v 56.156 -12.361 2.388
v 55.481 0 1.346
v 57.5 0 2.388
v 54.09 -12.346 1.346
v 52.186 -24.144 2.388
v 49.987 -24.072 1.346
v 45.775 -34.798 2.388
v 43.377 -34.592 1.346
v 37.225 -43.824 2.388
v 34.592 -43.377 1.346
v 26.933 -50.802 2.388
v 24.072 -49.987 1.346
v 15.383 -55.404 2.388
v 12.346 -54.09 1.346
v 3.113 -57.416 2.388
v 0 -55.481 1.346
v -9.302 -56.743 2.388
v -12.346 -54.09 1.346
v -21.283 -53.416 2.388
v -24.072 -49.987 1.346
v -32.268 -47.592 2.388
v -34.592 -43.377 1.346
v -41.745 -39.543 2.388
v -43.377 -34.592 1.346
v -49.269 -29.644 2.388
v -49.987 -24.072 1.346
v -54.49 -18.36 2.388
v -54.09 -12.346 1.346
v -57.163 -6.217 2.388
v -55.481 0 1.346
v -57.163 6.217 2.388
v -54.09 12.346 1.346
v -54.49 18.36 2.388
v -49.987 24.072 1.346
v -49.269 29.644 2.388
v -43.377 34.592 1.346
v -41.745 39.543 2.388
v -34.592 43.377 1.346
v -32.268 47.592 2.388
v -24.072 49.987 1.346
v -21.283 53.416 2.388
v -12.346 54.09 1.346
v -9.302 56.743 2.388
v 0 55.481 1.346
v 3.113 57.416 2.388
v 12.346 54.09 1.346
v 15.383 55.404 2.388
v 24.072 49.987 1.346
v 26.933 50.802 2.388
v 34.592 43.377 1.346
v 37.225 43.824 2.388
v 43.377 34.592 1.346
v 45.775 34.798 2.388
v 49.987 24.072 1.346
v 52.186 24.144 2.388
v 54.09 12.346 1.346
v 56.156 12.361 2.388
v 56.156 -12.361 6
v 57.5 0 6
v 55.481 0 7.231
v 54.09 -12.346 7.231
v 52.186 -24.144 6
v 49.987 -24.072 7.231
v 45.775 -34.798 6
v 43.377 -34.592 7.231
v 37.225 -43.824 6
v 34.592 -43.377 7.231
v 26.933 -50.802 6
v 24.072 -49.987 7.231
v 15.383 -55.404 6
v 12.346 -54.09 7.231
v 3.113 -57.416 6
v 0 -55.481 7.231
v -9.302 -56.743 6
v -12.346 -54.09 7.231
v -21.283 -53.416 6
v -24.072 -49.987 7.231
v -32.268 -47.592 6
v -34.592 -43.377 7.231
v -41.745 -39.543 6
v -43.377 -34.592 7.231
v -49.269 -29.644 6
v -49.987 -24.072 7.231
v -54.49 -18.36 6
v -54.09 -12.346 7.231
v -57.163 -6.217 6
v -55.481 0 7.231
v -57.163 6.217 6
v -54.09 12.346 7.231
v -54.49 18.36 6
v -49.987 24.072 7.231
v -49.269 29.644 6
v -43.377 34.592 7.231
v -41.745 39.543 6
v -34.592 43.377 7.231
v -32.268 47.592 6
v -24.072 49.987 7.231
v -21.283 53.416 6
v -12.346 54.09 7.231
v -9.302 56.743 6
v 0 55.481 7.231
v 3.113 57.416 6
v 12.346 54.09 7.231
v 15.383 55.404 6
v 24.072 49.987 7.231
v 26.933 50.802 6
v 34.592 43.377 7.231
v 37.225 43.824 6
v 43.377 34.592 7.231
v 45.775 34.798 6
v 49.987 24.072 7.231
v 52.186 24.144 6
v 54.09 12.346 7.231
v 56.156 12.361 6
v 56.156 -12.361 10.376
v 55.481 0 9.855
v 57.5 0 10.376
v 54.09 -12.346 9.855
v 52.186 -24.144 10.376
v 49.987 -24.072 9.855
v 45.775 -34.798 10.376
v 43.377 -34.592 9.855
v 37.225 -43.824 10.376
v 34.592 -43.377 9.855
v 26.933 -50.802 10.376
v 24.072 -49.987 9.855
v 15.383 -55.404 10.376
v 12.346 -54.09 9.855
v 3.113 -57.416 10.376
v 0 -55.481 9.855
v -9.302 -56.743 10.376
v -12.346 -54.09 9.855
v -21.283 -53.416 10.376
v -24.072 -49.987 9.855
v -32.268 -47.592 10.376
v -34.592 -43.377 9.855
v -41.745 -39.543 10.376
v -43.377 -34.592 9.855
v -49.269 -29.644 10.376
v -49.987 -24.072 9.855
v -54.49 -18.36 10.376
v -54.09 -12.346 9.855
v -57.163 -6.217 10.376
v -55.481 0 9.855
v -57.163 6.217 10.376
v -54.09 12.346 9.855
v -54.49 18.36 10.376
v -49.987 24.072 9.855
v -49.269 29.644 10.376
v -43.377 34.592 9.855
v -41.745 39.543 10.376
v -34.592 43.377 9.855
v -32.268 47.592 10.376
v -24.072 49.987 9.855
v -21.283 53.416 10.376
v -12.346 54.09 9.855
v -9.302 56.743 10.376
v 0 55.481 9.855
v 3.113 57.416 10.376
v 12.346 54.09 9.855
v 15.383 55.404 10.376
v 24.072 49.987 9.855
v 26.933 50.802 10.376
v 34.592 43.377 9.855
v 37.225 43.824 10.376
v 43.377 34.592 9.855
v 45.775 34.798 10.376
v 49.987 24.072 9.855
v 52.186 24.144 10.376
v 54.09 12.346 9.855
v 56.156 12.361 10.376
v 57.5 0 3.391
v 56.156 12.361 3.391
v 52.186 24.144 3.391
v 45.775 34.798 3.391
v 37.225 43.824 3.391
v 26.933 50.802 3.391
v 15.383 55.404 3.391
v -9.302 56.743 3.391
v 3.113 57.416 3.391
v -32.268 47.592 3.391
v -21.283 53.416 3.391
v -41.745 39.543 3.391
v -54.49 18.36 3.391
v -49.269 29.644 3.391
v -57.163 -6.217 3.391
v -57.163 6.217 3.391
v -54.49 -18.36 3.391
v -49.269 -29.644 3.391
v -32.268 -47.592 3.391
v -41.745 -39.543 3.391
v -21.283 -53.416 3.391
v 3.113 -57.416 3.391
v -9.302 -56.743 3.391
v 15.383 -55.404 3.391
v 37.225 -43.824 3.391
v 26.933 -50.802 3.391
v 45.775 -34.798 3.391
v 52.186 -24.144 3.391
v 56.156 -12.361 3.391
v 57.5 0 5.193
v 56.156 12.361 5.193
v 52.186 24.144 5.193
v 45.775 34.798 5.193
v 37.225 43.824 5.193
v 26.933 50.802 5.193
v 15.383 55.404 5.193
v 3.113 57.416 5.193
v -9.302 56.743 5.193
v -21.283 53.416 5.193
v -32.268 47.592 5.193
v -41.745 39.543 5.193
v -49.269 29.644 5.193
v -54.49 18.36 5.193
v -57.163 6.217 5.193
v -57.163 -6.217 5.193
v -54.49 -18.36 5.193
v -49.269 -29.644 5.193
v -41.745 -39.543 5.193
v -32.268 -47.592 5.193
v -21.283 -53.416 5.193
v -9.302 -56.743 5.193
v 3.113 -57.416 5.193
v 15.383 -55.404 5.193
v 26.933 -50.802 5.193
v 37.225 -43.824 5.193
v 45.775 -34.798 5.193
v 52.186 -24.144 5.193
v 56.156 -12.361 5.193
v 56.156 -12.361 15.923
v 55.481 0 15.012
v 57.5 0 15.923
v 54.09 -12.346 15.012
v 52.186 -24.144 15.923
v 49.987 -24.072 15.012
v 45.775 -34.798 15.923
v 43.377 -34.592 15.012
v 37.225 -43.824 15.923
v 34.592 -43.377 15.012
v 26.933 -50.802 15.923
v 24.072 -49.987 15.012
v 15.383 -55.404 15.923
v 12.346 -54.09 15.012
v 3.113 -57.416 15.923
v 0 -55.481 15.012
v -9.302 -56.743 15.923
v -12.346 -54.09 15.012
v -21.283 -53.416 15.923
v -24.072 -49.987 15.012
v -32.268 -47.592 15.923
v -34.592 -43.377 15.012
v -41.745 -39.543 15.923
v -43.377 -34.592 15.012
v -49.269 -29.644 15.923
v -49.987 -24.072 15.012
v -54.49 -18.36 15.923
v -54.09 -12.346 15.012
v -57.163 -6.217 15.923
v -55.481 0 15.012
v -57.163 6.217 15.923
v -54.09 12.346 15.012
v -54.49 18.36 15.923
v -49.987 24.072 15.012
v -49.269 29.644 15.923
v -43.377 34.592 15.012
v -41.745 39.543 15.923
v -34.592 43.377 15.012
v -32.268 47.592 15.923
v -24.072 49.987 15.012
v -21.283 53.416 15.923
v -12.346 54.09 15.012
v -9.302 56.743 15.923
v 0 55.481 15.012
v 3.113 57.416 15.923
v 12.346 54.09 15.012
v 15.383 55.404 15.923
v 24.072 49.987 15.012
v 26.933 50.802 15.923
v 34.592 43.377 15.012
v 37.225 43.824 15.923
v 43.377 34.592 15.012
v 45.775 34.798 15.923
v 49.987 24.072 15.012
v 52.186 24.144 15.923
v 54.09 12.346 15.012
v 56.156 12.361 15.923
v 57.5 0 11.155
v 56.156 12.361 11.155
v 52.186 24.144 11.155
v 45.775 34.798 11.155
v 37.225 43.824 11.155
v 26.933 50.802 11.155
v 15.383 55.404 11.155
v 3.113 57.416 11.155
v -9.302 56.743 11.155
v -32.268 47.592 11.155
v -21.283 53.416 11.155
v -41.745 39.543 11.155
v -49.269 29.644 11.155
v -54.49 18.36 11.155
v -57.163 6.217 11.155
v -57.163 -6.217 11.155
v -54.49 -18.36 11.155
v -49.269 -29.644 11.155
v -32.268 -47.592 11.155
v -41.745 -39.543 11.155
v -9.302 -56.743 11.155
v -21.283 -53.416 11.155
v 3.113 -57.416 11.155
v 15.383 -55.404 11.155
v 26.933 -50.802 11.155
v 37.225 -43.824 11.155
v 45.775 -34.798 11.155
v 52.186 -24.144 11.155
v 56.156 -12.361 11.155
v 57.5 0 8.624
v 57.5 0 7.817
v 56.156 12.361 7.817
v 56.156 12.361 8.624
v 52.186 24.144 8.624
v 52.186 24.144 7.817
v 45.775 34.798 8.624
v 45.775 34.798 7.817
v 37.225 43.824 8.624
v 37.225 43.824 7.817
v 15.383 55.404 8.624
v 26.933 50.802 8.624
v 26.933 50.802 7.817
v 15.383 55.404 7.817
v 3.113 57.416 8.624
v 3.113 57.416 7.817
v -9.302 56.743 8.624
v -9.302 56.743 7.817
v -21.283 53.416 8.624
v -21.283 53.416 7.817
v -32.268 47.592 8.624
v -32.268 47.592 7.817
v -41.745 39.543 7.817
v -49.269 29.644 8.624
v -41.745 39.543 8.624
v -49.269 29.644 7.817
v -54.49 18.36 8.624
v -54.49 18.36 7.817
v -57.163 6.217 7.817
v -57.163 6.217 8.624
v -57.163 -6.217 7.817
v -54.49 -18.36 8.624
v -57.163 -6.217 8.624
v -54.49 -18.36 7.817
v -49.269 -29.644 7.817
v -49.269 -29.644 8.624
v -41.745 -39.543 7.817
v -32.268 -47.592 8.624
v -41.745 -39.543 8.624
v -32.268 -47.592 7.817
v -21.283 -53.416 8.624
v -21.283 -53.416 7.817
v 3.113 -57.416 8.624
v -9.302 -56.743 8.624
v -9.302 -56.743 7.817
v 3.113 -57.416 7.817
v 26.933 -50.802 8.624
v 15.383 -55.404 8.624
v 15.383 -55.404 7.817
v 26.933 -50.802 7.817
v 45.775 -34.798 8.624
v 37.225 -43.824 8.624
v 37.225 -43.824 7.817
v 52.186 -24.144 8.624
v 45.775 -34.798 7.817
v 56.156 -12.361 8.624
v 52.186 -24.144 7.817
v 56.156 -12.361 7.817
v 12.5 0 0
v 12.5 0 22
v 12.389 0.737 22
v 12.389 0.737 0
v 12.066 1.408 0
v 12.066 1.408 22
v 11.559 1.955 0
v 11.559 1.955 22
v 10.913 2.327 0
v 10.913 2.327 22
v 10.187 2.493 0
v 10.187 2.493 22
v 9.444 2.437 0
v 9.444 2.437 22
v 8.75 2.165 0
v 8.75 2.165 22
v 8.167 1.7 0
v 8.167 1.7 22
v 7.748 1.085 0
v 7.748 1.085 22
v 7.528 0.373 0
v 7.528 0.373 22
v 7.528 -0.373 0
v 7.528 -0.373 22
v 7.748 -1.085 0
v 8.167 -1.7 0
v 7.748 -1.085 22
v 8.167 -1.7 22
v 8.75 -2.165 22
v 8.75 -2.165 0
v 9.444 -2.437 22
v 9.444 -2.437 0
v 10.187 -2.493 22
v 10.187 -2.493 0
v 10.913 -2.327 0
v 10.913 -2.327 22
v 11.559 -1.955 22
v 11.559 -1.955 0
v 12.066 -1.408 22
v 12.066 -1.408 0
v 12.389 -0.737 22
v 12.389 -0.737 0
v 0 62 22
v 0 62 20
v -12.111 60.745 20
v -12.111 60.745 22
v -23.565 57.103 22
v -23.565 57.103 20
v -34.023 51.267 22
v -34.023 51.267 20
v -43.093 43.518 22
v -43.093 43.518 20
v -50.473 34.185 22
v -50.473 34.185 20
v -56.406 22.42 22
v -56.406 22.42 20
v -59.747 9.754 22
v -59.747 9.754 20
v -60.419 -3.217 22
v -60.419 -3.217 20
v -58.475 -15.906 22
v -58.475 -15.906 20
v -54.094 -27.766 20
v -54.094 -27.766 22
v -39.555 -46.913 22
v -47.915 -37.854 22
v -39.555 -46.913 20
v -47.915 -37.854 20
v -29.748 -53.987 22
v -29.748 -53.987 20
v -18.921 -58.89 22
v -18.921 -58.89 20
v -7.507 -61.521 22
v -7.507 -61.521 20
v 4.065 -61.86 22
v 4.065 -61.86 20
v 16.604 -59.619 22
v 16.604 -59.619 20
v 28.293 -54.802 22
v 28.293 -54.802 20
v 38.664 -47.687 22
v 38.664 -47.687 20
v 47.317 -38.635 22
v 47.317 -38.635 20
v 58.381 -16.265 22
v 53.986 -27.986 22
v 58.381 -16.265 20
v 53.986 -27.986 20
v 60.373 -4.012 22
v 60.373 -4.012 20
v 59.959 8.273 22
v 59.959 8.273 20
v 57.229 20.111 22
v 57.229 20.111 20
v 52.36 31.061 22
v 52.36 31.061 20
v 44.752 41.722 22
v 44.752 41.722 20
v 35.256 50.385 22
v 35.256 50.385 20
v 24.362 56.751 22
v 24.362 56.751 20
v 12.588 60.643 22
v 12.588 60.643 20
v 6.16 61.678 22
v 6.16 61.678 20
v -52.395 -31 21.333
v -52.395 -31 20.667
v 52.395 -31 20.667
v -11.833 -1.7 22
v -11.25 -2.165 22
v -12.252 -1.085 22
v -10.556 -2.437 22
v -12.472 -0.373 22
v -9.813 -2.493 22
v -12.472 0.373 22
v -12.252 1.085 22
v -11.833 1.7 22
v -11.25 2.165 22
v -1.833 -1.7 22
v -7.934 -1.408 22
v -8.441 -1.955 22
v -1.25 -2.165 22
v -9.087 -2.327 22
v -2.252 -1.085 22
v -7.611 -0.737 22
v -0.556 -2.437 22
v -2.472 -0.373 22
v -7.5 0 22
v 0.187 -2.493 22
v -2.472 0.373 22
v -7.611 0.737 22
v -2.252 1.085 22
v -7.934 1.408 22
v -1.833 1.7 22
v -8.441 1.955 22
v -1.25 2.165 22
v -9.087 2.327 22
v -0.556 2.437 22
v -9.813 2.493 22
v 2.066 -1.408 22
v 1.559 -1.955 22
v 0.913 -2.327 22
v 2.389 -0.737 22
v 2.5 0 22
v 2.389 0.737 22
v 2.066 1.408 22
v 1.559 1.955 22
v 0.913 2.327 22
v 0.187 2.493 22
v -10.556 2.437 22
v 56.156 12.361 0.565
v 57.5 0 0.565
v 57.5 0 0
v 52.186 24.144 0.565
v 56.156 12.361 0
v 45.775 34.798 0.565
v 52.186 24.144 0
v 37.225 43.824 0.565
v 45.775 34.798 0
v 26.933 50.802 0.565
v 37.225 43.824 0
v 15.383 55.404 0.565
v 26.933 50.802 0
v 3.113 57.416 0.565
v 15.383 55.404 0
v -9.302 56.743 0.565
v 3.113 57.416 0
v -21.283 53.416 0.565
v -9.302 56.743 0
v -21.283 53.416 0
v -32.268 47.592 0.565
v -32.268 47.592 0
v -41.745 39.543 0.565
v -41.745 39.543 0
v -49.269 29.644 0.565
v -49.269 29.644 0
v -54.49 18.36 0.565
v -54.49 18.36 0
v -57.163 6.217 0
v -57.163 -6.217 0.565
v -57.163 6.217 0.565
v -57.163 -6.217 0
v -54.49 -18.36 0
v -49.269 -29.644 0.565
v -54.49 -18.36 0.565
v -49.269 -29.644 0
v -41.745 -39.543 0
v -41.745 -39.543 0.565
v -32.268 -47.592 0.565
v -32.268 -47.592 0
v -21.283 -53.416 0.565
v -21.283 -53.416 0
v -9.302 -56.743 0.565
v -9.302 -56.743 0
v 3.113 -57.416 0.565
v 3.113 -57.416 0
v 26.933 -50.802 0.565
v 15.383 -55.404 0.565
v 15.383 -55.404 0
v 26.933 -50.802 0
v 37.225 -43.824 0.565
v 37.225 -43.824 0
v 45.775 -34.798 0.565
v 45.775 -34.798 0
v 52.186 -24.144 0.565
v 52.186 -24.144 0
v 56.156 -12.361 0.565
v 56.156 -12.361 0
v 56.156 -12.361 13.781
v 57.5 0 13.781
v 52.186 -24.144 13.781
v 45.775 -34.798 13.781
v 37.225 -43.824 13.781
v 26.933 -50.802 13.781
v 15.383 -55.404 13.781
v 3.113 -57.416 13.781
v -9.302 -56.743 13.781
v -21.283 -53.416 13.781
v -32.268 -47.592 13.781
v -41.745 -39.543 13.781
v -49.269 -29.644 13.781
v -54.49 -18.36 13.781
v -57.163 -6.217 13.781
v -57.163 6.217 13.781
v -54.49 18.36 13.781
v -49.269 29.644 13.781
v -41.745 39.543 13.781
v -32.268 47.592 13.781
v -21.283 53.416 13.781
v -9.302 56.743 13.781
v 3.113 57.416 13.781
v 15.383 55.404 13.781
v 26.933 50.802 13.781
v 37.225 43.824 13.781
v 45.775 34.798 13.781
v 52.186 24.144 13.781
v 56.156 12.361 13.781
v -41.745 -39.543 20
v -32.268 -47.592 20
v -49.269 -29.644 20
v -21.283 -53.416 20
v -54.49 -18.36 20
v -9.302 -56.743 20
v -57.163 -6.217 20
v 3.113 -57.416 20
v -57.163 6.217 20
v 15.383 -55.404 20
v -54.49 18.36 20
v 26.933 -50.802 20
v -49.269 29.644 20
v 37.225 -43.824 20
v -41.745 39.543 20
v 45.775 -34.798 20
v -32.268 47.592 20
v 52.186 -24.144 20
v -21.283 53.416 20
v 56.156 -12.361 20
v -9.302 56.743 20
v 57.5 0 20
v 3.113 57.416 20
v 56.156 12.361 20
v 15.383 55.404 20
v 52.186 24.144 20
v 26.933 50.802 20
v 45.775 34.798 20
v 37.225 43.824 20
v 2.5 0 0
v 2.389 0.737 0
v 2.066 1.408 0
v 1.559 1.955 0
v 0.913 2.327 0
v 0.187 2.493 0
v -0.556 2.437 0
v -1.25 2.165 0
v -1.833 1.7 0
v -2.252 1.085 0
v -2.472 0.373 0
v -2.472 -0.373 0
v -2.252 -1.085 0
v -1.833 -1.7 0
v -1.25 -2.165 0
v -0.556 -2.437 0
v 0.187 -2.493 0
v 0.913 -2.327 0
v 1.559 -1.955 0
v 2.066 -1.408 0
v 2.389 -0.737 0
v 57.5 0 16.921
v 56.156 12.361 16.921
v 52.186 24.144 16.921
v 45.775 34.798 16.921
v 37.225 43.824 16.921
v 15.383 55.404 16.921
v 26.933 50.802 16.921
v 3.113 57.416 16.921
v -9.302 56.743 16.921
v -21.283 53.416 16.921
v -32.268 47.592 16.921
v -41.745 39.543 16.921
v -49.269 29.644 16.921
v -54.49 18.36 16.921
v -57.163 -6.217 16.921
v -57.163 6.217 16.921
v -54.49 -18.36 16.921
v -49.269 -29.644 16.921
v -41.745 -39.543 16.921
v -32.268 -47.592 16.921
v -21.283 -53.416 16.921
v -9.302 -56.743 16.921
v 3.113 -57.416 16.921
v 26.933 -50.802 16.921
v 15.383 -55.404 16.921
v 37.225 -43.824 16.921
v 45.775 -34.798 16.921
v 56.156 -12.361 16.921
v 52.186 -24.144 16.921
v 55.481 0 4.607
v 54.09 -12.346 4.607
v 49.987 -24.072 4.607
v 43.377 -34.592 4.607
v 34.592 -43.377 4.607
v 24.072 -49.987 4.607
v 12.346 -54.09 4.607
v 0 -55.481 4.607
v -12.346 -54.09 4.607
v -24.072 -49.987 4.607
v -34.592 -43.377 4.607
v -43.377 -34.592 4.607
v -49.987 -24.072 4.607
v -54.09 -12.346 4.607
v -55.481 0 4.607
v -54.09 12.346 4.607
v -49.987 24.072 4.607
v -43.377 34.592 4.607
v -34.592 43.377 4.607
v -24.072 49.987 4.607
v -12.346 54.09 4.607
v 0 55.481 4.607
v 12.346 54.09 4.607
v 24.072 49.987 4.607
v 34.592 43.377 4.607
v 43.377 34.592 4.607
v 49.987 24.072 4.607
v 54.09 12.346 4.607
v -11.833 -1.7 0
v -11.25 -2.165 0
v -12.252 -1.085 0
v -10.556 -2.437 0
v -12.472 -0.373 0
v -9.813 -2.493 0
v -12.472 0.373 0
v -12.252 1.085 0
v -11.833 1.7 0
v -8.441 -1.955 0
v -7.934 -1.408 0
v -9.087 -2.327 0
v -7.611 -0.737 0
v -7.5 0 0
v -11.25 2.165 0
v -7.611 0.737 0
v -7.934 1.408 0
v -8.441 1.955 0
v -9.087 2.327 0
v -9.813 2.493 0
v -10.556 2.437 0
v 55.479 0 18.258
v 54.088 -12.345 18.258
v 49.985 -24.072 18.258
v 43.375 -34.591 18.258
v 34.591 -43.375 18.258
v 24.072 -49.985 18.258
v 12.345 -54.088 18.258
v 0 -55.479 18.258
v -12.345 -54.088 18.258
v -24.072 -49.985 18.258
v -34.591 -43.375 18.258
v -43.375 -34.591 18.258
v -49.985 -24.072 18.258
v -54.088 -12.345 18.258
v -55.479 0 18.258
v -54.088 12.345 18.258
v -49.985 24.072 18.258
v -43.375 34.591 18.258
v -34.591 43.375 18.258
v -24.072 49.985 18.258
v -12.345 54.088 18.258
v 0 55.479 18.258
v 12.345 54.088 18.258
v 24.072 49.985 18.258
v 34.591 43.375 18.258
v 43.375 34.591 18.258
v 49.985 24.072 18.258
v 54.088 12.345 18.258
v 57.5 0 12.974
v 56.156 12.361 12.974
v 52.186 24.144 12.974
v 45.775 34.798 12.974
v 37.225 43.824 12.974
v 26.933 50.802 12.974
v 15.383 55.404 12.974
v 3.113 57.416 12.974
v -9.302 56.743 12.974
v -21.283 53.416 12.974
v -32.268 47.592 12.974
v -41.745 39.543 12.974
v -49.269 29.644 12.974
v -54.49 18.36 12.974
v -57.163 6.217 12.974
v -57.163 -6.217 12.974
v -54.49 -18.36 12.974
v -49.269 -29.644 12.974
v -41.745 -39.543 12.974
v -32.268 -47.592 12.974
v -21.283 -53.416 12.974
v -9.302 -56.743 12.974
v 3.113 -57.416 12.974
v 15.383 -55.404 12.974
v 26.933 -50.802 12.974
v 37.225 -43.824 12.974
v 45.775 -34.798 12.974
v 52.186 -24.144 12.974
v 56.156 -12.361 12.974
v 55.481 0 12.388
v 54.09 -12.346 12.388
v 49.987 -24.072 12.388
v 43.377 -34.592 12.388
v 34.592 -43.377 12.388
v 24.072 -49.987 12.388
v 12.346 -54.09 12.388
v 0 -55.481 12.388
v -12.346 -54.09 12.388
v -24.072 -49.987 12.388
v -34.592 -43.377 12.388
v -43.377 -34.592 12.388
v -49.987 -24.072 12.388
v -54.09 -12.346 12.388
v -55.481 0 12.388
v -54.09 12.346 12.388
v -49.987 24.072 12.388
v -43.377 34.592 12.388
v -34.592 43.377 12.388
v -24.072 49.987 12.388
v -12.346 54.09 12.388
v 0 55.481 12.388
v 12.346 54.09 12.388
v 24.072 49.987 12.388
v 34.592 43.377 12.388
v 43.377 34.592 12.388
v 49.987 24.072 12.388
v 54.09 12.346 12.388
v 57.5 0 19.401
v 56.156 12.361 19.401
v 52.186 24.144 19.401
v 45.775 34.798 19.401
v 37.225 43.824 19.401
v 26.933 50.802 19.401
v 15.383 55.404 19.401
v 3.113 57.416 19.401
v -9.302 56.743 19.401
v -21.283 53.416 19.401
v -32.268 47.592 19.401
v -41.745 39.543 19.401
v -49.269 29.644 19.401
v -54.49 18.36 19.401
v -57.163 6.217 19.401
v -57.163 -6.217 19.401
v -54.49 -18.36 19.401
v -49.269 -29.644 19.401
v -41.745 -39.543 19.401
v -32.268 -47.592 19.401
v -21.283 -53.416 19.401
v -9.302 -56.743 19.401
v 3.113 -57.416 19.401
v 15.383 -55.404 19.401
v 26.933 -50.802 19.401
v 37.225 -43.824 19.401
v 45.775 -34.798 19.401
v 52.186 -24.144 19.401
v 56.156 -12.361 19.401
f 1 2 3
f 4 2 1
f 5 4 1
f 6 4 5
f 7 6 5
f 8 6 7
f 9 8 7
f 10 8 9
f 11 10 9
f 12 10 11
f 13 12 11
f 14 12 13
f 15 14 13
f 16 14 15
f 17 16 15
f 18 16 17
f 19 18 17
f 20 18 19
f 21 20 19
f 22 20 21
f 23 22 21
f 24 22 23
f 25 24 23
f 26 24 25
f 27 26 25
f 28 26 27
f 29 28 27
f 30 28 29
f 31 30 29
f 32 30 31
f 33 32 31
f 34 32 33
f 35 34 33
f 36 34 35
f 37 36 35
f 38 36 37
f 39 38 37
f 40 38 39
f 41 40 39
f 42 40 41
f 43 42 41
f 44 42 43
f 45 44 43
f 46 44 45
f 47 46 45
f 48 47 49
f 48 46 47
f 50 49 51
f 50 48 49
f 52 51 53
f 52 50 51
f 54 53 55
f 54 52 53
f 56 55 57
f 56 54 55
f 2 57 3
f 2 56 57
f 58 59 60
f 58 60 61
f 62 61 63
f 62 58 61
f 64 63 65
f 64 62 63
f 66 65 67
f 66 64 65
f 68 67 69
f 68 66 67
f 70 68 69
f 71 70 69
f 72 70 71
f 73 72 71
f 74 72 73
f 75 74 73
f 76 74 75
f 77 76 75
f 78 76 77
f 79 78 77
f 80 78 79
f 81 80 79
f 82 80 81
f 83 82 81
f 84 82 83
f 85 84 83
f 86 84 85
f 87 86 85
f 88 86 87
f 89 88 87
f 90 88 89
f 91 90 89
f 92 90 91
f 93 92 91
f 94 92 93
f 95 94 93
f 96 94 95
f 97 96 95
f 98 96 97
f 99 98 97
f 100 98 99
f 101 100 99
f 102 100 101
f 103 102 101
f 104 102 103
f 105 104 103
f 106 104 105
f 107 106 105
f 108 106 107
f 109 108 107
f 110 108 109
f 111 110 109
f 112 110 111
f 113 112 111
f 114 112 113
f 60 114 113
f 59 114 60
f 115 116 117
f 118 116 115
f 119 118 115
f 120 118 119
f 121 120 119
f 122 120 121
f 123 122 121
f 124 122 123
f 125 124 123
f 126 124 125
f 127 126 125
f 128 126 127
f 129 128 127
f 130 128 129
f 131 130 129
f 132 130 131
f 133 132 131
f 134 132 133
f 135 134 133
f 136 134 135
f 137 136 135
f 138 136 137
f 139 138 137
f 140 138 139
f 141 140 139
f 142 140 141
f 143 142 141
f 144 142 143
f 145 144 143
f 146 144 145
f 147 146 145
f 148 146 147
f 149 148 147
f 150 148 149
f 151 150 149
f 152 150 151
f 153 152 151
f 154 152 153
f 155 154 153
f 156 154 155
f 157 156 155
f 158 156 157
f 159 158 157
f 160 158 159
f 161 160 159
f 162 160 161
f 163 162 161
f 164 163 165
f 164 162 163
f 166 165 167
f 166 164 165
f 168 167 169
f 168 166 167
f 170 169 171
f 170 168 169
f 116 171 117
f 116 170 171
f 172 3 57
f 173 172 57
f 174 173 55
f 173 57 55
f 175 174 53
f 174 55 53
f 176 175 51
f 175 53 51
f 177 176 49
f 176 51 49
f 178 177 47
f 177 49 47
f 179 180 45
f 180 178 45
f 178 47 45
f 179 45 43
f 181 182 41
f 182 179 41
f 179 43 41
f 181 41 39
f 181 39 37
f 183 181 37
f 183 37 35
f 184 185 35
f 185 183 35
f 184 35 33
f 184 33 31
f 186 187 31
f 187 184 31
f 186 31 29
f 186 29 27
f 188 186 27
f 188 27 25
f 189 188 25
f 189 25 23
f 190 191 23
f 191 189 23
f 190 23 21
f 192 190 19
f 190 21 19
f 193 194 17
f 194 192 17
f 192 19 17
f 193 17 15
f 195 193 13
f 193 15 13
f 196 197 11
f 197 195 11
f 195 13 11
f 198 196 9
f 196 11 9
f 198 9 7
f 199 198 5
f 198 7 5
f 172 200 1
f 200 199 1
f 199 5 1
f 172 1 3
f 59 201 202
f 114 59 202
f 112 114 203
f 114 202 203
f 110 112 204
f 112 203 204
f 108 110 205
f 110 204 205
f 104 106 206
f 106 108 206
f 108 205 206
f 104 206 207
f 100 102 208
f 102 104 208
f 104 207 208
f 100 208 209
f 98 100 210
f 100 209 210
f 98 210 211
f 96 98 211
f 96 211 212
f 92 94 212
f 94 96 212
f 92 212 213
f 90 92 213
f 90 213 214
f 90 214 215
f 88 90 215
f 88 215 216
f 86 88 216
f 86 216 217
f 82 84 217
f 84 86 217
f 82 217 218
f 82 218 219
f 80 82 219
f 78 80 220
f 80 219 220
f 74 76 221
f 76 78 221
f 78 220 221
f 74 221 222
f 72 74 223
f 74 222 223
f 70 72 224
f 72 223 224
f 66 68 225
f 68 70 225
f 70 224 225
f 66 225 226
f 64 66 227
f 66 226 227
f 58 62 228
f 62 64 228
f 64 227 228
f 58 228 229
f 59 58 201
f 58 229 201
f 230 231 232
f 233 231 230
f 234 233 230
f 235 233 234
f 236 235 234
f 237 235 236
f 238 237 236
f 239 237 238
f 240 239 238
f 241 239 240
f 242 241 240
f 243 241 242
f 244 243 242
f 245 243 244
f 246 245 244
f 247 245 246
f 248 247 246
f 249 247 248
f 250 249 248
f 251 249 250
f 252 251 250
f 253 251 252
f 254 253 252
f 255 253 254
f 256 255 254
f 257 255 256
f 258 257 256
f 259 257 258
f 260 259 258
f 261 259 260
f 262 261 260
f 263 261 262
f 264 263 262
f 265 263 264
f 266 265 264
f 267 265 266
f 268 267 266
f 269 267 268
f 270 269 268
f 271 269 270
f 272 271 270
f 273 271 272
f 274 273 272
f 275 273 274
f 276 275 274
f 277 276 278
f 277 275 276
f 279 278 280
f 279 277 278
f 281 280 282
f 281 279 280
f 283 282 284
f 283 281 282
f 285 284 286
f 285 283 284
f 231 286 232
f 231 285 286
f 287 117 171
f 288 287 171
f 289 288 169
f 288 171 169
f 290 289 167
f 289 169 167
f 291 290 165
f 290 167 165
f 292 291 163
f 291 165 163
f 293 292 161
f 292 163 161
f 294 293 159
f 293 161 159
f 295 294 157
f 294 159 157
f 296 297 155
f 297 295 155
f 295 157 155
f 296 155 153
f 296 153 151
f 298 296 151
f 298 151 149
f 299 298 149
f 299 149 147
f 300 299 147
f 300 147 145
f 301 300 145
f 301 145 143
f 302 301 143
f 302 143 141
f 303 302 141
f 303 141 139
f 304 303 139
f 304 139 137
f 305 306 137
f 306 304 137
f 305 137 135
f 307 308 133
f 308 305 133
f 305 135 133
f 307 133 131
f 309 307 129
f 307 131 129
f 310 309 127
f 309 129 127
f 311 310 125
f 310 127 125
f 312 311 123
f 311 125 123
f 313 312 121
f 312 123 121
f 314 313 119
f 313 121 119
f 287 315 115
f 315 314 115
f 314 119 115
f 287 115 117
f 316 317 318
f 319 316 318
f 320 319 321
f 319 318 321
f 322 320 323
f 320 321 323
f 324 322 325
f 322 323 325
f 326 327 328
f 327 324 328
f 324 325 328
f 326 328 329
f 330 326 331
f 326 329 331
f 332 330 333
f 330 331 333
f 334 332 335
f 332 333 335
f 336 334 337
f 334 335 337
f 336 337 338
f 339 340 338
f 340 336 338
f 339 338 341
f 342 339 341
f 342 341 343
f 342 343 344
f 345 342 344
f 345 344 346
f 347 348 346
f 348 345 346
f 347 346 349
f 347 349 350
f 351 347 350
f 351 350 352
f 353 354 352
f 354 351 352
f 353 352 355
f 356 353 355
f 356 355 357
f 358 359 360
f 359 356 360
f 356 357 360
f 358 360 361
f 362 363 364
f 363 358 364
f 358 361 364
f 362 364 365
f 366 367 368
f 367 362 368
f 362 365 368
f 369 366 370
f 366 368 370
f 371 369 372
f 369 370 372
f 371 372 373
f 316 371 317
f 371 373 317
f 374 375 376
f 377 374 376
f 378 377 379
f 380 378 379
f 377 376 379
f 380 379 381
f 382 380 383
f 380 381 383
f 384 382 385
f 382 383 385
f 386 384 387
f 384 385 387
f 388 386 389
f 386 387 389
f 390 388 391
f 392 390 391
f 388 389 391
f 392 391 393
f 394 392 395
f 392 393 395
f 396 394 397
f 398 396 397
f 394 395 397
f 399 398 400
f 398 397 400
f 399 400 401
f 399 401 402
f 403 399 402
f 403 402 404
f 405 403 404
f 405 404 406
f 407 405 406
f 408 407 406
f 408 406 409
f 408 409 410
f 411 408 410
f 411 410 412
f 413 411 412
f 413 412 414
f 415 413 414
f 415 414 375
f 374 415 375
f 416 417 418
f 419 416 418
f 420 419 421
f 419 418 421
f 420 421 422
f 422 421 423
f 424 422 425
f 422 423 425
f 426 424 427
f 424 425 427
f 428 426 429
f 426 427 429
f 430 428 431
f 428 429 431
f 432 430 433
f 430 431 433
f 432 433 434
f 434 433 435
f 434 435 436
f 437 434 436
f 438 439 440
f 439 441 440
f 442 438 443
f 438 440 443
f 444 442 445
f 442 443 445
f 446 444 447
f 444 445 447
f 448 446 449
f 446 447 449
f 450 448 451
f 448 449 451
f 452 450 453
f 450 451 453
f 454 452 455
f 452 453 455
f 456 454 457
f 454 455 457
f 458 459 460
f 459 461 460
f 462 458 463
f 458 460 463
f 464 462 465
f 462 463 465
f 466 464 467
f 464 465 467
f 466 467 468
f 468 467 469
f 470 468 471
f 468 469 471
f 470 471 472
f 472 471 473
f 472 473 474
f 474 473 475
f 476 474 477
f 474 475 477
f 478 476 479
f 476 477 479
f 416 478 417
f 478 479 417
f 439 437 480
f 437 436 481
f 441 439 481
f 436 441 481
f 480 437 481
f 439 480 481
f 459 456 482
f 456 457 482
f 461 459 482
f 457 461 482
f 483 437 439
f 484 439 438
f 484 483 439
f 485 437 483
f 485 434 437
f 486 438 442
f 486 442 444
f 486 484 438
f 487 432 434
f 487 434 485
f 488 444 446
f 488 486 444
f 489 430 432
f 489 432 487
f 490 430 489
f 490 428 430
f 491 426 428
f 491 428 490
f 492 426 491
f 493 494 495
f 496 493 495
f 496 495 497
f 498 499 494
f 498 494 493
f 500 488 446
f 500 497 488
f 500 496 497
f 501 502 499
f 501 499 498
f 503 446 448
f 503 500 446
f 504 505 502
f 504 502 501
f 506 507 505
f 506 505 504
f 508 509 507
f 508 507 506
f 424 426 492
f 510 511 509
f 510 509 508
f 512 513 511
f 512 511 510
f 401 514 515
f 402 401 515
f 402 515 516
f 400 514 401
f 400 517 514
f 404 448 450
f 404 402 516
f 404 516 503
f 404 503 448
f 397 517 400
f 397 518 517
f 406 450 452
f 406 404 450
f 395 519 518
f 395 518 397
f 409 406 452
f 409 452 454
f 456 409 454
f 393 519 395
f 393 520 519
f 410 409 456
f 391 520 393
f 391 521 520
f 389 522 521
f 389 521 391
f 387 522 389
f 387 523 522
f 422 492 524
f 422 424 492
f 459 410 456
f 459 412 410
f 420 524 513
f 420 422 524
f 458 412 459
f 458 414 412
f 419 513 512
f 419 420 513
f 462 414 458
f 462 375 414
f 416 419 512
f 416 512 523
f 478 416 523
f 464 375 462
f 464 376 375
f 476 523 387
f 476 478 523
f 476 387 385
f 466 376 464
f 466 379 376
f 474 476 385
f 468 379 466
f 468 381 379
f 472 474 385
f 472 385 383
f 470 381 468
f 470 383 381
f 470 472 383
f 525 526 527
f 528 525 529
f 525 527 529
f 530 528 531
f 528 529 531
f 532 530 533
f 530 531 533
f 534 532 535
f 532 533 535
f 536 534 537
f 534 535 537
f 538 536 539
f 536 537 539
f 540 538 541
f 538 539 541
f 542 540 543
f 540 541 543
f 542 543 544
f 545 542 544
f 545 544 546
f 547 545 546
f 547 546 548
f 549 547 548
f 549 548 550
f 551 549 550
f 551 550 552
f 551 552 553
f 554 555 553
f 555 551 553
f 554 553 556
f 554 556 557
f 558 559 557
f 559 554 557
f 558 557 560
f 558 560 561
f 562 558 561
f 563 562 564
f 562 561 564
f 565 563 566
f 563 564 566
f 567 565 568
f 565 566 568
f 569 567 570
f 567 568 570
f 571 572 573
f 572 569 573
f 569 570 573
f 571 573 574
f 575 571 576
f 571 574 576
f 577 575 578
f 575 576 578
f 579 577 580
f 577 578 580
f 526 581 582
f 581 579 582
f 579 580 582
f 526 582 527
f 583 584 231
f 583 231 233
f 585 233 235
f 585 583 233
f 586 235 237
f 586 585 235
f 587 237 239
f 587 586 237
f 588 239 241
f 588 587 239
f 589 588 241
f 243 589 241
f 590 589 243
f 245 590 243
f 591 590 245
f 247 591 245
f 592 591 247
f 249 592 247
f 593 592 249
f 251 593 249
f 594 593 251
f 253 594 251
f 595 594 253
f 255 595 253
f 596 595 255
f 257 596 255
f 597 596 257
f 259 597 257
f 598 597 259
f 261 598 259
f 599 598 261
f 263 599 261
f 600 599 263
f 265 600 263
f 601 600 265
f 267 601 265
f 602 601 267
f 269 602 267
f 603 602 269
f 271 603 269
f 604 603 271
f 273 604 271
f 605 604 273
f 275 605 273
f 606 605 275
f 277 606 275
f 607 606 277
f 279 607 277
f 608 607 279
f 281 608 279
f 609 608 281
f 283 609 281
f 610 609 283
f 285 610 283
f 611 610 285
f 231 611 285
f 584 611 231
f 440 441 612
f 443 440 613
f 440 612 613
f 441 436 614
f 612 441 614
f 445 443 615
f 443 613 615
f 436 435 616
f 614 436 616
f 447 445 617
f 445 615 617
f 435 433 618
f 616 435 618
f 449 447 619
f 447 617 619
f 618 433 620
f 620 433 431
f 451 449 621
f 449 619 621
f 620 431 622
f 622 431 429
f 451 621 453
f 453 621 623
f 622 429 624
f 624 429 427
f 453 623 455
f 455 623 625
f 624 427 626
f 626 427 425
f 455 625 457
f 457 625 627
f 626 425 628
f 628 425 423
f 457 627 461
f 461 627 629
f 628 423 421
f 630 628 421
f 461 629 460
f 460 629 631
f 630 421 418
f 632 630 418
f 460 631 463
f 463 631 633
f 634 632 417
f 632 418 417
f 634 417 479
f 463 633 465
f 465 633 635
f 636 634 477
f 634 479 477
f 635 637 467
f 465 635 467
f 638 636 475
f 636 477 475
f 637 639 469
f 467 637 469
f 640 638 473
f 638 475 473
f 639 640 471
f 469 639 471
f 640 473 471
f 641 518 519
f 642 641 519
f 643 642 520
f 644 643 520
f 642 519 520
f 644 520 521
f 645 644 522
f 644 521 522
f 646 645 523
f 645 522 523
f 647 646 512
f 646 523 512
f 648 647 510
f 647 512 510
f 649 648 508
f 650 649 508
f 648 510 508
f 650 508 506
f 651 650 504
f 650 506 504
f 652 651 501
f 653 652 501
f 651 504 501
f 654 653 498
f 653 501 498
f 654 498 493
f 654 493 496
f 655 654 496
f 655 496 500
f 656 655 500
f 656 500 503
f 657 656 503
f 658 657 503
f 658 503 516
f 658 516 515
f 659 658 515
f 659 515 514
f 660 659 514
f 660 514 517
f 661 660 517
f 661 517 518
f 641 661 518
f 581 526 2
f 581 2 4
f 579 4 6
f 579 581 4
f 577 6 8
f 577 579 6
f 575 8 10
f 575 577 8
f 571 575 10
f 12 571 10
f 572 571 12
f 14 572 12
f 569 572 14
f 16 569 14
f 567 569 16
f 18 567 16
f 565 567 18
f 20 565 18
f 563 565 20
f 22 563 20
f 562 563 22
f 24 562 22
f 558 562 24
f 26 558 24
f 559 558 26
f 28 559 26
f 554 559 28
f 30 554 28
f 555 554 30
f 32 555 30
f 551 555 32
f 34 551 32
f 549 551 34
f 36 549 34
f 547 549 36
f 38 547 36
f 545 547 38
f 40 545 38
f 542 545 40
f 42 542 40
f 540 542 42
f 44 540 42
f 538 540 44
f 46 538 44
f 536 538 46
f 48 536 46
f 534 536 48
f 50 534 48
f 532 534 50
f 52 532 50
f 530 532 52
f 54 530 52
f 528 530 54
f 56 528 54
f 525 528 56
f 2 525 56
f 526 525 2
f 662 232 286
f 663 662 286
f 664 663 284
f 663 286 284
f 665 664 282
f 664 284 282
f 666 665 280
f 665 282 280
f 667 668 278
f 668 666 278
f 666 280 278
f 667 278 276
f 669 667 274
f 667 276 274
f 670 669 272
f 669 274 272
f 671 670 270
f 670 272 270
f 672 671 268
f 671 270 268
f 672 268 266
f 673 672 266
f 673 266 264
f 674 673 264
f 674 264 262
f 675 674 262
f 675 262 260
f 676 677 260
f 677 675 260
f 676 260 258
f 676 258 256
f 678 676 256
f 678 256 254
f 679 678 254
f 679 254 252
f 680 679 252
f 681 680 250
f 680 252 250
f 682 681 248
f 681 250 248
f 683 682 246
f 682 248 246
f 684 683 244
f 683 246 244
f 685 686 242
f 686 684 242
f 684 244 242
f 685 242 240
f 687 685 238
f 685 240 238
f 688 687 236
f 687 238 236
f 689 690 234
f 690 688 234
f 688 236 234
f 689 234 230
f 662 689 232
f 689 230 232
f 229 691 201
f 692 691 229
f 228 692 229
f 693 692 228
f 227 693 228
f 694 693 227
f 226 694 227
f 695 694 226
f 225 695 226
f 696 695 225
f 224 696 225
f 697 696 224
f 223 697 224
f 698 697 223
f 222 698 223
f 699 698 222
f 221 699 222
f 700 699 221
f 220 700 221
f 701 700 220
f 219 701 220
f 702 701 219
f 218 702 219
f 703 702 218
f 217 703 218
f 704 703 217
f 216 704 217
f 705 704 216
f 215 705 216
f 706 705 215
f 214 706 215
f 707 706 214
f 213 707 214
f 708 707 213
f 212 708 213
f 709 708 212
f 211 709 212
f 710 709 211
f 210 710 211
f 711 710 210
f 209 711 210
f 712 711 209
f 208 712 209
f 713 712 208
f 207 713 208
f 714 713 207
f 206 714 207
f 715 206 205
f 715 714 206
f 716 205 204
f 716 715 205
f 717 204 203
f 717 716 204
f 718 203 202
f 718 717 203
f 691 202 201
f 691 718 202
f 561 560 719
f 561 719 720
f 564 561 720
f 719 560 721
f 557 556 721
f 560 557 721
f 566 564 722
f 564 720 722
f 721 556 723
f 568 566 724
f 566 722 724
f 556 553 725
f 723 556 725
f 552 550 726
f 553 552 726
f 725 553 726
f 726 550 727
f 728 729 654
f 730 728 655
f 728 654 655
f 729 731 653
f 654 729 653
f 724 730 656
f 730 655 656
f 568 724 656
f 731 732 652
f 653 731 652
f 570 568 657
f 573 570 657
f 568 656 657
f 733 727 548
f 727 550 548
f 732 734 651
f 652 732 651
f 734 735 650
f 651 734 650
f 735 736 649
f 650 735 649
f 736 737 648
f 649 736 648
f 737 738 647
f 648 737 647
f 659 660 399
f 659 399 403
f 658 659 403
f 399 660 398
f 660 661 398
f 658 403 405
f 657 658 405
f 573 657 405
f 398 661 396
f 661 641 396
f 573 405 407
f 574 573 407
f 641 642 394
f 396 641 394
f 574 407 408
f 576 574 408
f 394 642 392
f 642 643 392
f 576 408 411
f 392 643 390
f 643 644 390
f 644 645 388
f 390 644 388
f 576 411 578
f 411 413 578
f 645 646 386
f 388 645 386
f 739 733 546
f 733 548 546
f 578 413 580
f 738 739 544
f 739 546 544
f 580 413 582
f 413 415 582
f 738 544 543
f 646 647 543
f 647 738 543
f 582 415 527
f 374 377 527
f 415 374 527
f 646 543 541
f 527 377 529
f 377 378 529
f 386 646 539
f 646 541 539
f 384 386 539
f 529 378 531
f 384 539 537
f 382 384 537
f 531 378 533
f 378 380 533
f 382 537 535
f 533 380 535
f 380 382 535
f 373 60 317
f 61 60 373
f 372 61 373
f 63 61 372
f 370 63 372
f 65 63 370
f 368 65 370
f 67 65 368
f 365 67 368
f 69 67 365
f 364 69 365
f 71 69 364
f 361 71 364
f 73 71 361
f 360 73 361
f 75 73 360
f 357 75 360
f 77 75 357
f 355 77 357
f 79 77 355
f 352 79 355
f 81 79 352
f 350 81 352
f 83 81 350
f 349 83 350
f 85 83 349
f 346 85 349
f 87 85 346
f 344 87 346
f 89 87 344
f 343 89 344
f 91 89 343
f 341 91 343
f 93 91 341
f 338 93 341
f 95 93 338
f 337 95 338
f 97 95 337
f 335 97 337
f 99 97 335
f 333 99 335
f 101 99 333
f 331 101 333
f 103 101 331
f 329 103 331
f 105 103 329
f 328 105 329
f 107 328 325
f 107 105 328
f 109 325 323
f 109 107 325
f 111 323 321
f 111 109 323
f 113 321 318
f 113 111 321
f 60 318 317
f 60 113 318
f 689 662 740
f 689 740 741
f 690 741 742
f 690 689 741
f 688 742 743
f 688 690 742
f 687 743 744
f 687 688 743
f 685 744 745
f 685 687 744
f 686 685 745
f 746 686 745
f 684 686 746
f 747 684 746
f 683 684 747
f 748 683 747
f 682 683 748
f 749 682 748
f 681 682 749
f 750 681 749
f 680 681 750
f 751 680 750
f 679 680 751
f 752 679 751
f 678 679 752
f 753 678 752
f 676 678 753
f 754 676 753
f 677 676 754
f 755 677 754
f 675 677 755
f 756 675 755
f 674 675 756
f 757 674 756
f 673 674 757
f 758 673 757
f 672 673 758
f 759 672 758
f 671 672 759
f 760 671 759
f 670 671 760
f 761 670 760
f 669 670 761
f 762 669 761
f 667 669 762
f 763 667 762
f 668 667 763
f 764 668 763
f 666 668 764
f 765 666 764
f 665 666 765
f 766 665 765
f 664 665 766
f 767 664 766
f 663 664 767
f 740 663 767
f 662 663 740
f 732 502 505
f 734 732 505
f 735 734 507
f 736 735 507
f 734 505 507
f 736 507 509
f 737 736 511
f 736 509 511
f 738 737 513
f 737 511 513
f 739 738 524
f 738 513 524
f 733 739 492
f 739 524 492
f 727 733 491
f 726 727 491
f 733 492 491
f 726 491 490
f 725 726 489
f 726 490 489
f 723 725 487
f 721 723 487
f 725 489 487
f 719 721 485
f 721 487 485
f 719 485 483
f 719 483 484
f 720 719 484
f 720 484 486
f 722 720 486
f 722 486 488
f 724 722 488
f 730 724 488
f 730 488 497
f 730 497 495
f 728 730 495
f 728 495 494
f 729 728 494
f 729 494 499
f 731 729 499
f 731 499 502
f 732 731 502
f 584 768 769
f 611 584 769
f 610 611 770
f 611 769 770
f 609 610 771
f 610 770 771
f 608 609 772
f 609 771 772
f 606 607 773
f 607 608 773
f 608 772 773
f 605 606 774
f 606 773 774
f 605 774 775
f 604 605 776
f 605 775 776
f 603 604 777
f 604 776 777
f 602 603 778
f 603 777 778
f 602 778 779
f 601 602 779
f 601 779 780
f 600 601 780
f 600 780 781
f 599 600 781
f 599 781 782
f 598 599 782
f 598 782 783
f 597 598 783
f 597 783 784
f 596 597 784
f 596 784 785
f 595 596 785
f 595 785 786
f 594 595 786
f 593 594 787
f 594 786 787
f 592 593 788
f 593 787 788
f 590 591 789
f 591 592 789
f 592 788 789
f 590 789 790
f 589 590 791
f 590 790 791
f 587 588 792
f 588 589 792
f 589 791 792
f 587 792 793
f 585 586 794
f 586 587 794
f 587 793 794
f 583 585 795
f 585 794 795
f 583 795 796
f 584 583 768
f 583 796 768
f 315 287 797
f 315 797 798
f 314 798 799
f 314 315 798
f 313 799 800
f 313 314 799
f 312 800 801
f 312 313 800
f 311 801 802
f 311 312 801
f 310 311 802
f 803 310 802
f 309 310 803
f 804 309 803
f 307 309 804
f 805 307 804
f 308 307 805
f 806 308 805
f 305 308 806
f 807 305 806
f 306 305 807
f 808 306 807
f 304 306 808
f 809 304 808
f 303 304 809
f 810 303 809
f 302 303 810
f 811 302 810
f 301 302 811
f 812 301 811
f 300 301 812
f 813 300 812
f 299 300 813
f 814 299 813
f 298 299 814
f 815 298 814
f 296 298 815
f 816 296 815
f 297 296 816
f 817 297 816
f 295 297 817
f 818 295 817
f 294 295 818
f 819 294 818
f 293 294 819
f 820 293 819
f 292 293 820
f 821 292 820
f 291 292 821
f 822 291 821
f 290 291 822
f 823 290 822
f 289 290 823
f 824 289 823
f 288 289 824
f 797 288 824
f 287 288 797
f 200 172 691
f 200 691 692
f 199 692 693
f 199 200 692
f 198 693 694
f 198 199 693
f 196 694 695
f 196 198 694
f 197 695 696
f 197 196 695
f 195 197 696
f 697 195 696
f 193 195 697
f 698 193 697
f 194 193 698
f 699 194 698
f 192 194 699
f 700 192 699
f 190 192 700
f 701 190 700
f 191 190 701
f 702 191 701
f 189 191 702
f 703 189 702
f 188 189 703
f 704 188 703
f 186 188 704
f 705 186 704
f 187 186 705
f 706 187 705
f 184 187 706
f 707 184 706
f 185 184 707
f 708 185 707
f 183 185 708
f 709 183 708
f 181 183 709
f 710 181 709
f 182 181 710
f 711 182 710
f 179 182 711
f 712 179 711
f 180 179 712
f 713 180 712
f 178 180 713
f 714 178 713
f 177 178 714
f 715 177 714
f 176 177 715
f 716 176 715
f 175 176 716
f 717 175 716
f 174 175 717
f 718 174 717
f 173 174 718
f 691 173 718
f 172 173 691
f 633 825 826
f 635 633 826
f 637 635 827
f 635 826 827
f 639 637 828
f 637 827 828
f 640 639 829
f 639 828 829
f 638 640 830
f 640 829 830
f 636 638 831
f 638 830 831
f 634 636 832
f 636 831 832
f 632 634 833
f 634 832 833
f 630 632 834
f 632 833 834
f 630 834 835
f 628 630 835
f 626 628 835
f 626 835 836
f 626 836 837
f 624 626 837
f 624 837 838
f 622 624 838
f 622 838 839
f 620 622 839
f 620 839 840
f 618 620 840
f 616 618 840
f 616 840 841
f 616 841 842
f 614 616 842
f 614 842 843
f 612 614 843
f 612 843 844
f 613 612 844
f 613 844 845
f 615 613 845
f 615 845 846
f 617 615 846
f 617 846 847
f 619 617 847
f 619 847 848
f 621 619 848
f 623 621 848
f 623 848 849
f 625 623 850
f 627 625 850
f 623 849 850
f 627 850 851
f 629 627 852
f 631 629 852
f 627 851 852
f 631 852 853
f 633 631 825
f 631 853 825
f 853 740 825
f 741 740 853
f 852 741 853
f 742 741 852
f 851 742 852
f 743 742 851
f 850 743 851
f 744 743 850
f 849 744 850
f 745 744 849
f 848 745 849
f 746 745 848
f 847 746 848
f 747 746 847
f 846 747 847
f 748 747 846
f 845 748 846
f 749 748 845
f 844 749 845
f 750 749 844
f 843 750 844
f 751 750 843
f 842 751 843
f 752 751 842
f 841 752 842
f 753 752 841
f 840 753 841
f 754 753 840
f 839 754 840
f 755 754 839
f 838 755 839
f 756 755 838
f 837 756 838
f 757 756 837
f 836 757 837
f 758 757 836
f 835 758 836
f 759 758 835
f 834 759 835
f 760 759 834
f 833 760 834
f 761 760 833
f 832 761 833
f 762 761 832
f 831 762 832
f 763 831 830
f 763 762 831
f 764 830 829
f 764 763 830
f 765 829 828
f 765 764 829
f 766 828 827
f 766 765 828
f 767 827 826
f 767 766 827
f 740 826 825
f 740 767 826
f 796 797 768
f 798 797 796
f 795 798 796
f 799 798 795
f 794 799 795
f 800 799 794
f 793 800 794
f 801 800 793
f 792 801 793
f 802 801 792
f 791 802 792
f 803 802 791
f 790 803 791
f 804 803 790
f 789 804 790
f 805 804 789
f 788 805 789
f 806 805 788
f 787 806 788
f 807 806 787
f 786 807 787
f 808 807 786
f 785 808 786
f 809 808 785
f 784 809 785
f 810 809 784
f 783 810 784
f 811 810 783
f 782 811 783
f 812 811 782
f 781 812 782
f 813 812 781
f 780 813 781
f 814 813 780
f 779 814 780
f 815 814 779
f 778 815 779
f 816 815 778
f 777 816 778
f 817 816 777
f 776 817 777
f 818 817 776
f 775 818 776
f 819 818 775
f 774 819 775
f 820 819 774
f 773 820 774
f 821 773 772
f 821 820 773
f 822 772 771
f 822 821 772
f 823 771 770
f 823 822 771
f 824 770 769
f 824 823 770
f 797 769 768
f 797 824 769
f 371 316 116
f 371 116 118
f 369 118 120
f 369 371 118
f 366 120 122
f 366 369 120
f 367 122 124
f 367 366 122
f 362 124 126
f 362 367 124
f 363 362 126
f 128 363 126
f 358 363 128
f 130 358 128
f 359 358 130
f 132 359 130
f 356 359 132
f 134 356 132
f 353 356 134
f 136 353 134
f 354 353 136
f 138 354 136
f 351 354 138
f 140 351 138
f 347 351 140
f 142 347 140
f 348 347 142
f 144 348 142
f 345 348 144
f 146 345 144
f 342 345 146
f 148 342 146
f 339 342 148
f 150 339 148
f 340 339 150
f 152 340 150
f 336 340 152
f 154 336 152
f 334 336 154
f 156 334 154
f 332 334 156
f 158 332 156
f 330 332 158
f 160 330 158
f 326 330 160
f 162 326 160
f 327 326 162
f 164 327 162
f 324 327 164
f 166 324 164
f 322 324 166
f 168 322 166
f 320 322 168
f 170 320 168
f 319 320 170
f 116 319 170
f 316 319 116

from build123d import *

# Parameters (mm, degrees)
F0_R     = 57.5
F1_DEPTH = 20
F3_DEPTH = 2
F4_R     = 2.5
F5_DEPTH = 22.001


with BuildPart() as f1:
    # F0 (on Top) → F1 (new body)
    with BuildSketch(Plane.XY):
        Circle(F0_R)
    extrude(amount=F1_DEPTH)

    # F2 (on face) → F3 (join)
    with BuildSketch(Plane.XY.offset(20)):
        with BuildLine():
            add(Edge.make_bspline(
                [(0, 62), (-104.789074, 62), (-52.394537, -31), (0, -124), (52.394537, -31), (104.789074, 62), (0, 62)],
                knots=[0, 0, 0, 2.094395, 2.094395, 4.18879, 4.18879, 6.283185, 6.283185, 6.283185], degree=2, weights=[1, 0.5, 1, 0.5, 1, 0.5, 1]))
        make_face()
    extrude(amount=F3_DEPTH)

    # F4 (on face) → F5 (cut, through all)
    with BuildSketch(Plane.XY.offset(22)):
        Circle(F4_R)
        with Locations((10, 0)):
            Circle(F4_R)
        with Locations((-10, 0)):
            Circle(F4_R)
    extrude(amount=-F5_DEPTH, mode=Mode.SUBTRACT)

    # F6 (on Front) → F7 (revolve, cut)
    with BuildSketch(Plane.XZ):
        Polygon((68.928674, 19.907886), (58.39657, 19.907886), (55.479165, 18.257678), (58.39657, 16.328355), (55.48143, 15.011839), (58.39657, 13.234262), (55.48143, 12.387931), (58.39657, 10.60732), (55.48143, 9.855025), (58.39657, 8.077448), (55.48143, 7.231116), (58.39657, 5.453539), (55.48143, 4.607208), (58.39657, 2.850865), (55.48143, 1.346276), (58.960788, 0), (68.928674, 0), align=None)
    revolve(axis=Axis((0, 0, 8.684125), (0, 0, -1)), mode=Mode.SUBTRACT)


solid = f1.part
